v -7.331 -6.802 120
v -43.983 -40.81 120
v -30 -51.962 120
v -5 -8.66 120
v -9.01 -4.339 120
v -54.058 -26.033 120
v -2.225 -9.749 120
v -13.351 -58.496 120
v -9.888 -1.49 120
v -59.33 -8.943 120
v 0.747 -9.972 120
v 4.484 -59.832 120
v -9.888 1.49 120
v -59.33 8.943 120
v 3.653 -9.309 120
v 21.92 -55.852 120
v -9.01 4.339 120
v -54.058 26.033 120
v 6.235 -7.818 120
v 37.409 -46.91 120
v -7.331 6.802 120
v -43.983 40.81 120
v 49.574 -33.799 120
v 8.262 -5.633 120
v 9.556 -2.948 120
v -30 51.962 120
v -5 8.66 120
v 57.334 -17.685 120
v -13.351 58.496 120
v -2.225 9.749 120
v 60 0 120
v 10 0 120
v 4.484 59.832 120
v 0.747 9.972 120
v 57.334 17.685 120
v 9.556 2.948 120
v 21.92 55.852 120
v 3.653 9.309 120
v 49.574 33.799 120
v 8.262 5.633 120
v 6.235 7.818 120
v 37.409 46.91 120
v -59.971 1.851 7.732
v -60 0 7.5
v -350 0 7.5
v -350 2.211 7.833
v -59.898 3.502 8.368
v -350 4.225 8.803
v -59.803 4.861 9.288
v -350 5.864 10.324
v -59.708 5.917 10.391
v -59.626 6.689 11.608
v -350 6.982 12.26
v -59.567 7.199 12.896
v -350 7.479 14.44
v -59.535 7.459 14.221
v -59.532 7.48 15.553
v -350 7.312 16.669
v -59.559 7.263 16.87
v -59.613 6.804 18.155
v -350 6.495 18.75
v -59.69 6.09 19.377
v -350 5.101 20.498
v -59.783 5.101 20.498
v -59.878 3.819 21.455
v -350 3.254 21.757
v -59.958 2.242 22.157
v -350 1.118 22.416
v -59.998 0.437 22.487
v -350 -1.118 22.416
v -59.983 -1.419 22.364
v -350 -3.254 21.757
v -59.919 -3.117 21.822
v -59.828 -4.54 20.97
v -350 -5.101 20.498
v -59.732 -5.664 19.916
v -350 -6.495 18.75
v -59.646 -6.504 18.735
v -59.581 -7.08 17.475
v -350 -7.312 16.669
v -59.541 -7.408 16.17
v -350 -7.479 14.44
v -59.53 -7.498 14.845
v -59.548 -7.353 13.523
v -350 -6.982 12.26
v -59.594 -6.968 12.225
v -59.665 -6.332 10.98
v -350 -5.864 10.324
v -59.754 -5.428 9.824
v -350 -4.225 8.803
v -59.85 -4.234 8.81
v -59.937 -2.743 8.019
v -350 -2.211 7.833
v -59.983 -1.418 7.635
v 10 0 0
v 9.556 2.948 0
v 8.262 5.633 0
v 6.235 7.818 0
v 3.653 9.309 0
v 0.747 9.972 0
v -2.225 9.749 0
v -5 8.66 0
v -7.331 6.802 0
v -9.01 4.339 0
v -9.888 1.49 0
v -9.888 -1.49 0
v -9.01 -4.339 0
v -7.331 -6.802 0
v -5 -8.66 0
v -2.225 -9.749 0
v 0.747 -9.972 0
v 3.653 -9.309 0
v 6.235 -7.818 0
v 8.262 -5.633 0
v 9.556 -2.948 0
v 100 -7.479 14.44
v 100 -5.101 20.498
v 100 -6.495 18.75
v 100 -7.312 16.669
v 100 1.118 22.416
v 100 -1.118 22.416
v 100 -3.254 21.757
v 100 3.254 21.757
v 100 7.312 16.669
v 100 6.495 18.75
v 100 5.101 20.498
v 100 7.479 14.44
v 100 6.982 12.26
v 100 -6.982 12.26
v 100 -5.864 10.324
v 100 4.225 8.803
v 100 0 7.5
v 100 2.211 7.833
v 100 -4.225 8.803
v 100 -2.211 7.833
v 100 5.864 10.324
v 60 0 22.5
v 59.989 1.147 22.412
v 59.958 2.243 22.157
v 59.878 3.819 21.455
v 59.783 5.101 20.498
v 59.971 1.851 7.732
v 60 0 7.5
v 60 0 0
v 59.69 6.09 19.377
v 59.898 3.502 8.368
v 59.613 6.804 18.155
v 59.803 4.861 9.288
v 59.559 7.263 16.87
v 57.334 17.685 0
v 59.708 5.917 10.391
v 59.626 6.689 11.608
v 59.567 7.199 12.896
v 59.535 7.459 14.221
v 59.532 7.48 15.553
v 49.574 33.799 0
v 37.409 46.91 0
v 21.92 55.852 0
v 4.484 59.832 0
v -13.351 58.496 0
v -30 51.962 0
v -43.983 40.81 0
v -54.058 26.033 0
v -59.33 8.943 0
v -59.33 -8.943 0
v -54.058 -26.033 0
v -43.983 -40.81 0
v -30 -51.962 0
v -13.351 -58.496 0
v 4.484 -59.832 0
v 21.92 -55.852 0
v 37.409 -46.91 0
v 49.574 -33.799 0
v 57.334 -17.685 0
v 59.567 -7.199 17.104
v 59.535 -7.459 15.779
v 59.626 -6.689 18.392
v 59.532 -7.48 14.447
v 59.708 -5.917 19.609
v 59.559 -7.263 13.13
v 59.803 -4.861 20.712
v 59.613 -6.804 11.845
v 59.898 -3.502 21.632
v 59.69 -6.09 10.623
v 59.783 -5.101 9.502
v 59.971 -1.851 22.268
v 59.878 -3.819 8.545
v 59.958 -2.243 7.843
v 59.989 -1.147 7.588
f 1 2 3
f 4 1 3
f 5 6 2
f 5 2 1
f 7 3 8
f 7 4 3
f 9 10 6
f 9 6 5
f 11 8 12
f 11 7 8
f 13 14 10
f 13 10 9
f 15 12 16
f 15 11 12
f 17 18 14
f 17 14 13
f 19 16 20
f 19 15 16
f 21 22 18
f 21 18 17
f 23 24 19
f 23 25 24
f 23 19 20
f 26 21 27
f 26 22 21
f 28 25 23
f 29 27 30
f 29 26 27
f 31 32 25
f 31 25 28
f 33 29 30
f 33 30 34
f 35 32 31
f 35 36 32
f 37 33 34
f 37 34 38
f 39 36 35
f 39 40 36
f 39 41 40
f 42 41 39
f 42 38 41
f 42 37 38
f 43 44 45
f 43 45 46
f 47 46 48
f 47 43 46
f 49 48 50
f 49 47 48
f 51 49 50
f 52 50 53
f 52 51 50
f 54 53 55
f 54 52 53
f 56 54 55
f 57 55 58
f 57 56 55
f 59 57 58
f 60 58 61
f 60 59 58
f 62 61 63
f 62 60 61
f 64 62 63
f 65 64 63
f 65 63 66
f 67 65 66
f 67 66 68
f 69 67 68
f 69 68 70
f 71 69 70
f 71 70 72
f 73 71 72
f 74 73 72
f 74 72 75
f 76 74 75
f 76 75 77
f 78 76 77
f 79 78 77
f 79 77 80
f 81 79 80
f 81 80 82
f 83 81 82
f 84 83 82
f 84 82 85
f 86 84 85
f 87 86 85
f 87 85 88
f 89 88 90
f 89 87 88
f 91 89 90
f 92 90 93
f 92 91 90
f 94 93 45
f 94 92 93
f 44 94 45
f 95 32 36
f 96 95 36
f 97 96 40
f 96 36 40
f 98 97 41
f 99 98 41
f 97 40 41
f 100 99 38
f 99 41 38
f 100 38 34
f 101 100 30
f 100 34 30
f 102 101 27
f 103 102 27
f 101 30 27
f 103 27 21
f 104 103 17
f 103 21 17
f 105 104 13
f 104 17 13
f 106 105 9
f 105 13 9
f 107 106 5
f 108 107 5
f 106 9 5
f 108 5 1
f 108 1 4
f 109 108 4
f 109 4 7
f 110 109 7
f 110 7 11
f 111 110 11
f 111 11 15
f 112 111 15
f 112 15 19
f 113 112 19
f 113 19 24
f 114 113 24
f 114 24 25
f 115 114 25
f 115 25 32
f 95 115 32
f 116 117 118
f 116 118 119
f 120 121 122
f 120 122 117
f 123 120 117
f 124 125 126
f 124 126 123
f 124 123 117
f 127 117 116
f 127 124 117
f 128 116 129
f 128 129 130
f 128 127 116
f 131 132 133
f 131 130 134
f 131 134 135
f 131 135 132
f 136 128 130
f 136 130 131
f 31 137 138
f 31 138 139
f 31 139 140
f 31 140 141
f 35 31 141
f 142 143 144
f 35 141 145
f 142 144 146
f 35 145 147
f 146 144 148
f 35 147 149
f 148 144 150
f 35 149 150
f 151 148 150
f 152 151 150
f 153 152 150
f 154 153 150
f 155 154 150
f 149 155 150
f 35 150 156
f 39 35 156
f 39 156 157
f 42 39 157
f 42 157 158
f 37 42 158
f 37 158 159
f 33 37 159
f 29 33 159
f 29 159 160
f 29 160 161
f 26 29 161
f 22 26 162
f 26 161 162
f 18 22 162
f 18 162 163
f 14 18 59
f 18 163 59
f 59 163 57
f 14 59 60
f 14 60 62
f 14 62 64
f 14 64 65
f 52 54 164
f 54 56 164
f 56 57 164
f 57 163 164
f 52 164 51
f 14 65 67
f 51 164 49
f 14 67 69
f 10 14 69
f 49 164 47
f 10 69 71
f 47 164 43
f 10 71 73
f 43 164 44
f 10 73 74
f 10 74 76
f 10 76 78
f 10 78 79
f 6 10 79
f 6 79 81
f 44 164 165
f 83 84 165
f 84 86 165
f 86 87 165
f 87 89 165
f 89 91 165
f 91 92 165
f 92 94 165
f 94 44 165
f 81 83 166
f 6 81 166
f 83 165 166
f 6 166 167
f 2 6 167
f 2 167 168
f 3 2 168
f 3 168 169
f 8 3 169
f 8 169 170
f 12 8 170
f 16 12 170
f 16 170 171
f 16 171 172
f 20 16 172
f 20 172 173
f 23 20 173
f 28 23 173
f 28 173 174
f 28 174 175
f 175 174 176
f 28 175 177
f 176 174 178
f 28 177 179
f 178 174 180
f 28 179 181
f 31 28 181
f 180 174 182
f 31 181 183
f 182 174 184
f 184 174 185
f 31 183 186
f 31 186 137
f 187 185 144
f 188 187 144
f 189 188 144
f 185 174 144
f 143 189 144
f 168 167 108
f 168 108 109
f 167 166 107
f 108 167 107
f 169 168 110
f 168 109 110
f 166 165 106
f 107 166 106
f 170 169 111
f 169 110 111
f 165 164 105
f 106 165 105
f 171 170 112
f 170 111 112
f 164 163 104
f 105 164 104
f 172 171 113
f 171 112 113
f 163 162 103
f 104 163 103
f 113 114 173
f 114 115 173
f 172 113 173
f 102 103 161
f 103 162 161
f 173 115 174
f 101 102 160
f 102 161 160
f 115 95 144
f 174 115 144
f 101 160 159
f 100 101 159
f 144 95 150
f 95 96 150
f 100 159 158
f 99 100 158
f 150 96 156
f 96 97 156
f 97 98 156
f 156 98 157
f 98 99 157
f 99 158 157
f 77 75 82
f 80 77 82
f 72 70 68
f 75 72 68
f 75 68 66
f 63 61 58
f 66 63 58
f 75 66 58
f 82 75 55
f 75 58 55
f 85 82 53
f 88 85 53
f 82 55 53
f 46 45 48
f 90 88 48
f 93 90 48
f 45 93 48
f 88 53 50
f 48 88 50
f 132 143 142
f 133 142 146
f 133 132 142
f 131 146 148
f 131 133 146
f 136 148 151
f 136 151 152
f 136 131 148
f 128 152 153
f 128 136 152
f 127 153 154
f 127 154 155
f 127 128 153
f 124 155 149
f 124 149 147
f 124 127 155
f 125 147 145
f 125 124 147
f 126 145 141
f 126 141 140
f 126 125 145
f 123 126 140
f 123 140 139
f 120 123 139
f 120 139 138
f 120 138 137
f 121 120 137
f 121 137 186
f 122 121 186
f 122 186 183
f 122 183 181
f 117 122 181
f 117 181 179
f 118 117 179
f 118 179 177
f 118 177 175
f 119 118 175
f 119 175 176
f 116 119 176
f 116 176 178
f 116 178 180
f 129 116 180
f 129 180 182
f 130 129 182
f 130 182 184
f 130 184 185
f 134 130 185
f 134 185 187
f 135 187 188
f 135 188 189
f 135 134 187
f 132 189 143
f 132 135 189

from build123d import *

# Parameters (mm, degrees)
SKETCH_1_R          = 60
EXTRUDE_1_DEPTH     = 120
SKETCH_3_R          = 7.5
EXTRUDE_3_DEPTH     = 350
SKETCH_4_R          = 10
CUT_EXTRUDE_1_DEPTH = 375.833296421
EXTRUDE_START       = 100
SKETCH_3_2_R        = 7.5
EXTRUDE_4_DEPTH     = 70


with BuildPart() as part:
    # 草图1 → 凸台-拉伸1 (new body)
    with BuildSketch(Plane.XY):
        Circle(SKETCH_1_R)
    extrude(amount=EXTRUDE_1_DEPTH)

    # 草图3 → 凸台-拉伸3 (add)
    with BuildSketch(Plane(origin=(0, 0, 0), x_dir=(0, 0, -1), z_dir=(1, 0, 0))):
        with Locations((-15, 0)):
            Circle(SKETCH_3_R)
    extrude(amount=-EXTRUDE_3_DEPTH)

    # 草图4 → 切除-拉伸1 (cut, through all)
    with BuildSketch(Plane.XY.offset(120)):
        Circle(SKETCH_4_R)
    extrude(amount=-CUT_EXTRUDE_1_DEPTH, mode=Mode.SUBTRACT)

    # 草图3<2> → 凸台-拉伸4 (add)
    with BuildSketch(Plane(origin=(0, 0, 0), x_dir=(0, 0, -1), z_dir=(1, 0, 0)).offset(EXTRUDE_START)):
        with Locations((-15, 0)):
            Circle(SKETCH_3_2_R)
    extrude(amount=-EXTRUDE_4_DEPTH)


solid = part.part
